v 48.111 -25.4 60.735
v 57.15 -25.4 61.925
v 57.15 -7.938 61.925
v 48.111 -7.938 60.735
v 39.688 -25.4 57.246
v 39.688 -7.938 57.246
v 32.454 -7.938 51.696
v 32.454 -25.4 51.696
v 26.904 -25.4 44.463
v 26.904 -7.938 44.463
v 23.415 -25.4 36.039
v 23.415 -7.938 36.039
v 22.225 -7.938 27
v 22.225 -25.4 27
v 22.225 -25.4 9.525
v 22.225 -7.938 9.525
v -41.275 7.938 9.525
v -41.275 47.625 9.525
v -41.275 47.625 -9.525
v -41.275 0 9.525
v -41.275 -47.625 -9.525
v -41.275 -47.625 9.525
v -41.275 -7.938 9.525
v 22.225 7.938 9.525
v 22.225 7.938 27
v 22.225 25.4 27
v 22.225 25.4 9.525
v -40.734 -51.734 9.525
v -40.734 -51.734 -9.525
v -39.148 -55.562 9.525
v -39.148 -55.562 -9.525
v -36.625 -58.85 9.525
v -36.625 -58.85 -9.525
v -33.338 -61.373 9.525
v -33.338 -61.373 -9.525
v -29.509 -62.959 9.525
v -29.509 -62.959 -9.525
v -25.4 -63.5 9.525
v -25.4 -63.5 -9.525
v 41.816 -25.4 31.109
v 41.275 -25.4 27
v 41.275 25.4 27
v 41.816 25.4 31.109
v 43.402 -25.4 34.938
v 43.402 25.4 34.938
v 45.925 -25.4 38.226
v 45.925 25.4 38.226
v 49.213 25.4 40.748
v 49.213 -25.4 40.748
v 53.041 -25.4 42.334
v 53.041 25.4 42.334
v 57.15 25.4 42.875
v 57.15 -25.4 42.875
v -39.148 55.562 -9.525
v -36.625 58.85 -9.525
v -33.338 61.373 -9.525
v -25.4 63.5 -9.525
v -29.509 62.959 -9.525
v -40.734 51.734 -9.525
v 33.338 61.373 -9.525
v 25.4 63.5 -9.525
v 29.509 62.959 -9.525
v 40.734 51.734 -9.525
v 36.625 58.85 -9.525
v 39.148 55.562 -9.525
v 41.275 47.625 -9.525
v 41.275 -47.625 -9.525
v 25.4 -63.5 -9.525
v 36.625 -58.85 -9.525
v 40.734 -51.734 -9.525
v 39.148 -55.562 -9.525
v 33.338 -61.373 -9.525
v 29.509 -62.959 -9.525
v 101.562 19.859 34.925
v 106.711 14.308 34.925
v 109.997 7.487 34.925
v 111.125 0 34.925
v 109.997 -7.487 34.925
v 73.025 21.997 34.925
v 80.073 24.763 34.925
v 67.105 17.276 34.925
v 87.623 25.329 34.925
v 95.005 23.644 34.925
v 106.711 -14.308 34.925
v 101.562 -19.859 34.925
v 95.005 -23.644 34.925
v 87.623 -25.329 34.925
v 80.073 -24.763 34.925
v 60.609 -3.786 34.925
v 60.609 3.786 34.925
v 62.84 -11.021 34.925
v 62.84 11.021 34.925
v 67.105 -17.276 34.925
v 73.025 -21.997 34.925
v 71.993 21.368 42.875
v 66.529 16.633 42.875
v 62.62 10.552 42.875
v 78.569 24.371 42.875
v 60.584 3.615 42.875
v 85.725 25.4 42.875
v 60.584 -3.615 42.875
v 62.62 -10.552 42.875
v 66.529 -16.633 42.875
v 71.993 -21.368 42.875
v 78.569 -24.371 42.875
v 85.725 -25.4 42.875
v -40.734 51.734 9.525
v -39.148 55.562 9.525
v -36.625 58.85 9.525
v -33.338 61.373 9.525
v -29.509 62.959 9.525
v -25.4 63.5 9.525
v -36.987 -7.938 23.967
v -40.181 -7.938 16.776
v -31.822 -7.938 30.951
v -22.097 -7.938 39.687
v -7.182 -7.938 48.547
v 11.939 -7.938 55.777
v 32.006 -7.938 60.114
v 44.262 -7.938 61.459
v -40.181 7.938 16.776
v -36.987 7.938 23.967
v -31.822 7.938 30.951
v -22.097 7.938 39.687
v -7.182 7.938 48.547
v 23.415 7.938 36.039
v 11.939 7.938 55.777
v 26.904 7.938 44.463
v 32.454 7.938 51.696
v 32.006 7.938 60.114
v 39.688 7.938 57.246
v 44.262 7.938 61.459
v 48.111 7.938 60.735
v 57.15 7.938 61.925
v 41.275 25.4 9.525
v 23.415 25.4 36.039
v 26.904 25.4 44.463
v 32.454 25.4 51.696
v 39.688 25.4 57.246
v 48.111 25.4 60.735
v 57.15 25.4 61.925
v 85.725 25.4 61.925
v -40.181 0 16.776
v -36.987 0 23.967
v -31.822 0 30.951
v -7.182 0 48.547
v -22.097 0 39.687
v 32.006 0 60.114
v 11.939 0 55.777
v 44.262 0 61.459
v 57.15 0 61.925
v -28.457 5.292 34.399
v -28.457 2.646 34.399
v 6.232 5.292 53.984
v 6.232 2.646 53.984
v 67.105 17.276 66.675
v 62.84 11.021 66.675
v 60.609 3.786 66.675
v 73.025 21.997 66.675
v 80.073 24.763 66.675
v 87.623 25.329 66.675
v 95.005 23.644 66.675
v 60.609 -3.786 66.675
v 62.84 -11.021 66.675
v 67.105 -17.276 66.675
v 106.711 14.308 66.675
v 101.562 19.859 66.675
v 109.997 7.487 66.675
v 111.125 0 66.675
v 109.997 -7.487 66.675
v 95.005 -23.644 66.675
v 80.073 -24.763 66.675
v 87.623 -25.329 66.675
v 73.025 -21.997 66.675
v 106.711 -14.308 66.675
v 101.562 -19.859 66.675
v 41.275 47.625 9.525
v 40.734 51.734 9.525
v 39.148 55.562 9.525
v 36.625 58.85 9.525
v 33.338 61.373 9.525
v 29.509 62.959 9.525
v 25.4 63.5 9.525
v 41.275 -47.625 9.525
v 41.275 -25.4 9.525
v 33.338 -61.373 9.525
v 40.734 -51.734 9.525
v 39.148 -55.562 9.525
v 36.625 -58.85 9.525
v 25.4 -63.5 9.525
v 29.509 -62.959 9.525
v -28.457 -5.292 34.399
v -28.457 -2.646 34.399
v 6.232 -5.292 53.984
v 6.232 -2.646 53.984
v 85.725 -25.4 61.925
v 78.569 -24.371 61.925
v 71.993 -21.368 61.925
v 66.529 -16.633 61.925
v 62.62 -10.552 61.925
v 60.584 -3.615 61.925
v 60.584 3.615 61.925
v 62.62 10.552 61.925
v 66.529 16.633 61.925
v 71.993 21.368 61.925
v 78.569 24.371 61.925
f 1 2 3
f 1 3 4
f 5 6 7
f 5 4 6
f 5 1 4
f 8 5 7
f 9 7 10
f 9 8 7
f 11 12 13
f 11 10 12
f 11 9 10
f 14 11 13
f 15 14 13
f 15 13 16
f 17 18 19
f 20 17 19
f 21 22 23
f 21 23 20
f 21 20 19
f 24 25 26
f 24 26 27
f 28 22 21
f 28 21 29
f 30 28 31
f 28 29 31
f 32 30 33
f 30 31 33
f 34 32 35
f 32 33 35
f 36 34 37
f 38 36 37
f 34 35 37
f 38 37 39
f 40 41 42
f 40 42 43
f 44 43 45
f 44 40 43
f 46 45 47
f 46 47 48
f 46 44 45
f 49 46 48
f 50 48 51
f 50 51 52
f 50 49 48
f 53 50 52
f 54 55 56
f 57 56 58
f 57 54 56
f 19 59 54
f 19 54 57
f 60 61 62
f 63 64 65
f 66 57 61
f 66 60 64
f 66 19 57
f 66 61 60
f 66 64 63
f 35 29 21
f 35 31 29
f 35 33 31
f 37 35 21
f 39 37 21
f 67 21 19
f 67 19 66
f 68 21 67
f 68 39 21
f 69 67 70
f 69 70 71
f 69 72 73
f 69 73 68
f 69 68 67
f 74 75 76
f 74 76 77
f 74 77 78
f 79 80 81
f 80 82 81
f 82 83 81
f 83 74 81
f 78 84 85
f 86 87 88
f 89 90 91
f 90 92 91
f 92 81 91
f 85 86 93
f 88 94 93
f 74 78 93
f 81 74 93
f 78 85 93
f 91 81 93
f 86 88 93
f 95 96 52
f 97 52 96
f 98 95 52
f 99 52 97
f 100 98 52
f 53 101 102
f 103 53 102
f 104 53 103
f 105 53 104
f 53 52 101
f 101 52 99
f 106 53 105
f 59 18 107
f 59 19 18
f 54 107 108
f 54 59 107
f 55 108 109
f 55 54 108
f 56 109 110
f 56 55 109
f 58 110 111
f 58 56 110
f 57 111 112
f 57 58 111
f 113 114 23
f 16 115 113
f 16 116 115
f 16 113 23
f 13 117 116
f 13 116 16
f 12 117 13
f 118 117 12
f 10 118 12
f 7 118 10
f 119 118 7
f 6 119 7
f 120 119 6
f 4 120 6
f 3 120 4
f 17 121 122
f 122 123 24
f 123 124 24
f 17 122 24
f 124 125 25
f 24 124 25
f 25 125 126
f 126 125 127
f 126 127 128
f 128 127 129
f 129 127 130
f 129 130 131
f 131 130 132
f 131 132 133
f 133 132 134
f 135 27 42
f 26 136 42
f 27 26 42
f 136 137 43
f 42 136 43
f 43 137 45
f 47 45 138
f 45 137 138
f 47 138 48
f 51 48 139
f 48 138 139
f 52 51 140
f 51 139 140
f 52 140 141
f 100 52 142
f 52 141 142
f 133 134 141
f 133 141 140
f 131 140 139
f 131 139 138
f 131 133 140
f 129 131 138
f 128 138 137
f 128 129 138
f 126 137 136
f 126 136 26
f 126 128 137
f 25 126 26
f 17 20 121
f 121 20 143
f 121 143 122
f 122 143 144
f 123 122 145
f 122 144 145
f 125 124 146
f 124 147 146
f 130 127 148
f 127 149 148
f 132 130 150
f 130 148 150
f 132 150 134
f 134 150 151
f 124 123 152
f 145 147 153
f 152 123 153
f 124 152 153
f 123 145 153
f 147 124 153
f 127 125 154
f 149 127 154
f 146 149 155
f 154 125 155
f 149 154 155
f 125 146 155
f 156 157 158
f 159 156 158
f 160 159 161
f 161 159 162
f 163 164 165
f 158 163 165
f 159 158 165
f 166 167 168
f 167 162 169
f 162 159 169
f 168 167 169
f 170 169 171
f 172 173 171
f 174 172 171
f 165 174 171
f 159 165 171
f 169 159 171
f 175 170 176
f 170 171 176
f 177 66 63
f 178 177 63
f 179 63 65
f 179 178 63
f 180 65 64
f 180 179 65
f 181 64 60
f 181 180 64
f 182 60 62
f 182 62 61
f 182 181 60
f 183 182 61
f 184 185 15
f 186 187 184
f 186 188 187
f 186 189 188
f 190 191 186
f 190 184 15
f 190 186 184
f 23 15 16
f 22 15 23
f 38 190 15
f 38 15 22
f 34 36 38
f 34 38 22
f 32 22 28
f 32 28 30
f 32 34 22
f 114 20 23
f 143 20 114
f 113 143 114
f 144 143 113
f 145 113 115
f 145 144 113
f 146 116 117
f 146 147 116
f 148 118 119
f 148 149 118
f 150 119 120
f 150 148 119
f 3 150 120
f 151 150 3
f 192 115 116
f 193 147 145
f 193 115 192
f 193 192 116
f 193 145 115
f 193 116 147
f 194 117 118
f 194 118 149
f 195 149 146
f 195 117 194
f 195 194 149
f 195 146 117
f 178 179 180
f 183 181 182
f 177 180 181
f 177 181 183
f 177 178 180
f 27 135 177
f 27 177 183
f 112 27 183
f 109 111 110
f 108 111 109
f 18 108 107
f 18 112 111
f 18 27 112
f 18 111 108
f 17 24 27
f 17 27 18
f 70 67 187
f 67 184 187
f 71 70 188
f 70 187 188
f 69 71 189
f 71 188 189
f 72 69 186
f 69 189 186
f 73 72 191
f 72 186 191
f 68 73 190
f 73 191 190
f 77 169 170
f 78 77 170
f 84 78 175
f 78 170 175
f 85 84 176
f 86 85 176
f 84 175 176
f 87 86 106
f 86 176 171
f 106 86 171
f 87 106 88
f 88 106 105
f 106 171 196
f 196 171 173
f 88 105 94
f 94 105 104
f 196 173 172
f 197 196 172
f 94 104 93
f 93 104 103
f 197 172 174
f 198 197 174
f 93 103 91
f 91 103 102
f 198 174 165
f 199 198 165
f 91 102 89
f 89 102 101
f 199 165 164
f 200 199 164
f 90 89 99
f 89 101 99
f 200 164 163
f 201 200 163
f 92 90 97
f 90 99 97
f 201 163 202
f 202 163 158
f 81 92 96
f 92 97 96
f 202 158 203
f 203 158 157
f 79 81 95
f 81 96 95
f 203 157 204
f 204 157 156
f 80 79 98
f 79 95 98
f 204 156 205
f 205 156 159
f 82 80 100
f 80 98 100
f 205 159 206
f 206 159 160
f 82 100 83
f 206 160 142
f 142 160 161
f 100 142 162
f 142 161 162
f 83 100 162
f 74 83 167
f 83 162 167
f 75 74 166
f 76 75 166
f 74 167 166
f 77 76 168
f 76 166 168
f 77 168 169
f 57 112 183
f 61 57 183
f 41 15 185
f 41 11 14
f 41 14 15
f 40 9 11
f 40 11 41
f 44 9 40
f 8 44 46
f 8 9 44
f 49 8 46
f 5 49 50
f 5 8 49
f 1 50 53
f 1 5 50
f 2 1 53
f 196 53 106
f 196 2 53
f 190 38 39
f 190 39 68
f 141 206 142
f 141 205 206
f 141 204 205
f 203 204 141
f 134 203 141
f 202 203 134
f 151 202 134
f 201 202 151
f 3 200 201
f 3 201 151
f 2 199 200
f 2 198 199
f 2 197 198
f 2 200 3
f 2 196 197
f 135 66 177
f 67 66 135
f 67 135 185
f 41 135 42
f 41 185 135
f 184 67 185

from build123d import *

# Parameters (mm, degrees)
F1_DEPTH = 63.5
F0_W     = 25.4
F0_H     = 19.05
F2_DEPTH = 25.4
F3_DEPTH = 7.9375
F5_R     = 15.875


with BuildPart() as f1:
    # F0 (on Front) → F1 (new body, symmetric)
    with BuildSketch(Plane.XZ):
        Polygon((41.275, -9.525), (41.275, 9.525), (22.225, 9.525), (-41.275, 9.525), (-41.275, -9.525), align=None)
    extrude(amount=F1_DEPTH, both=True)

    # F0 (on Front) → F2 (join, symmetric)
    with BuildSketch(Plane.XZ):
        Polygon((41.275, -9.525), (41.275, 9.525), (22.225, 9.525), (-41.275, 9.525), (-41.275, -9.525), align=None)
        with BuildLine():
            Line((22.225, 9.525), (41.275, 9.525))
            Line((41.275, 9.525), (41.275, 27.0002))
            ThreePointArc((41.275, 27.0002), (45.9246798487, 38.2255201513), (57.15, 42.8752))
            Line((57.15, 42.8752), (60.325, 42.8752))
            Line((60.325, 42.8752), (60.325, 61.9252))
            Line((60.325, 61.9252), (57.15, 61.9252))
            ThreePointArc((57.15, 61.9252), (32.4542956671, 51.6959043329), (22.225, 27.0002))
            Line((22.225, 27.0002), (22.225, 9.525))
        make_face()
        with Locations((73.025, 52.4002)):
            Rectangle(F0_W, F0_H)
    extrude(amount=F2_DEPTH, both=True)

    # F0 (on Front) → F3 (join, symmetric)
    with BuildSketch(Plane.XZ):
        with BuildLine():
            Line((-41.275, 9.525), (22.225, 9.525))
            Line((22.225, 9.525), (22.225, 27.0002))
            ThreePointArc((22.225, 27.0002), (32.4542956671, 51.6959043329), (57.15, 61.9252))
            add(Edge.make_bspline(
                [(-41.275, 9.525), (-41.275, 34.925), (0, 61.9252), (57.15, 61.9252)],
                knots=[0, 0, 0, 0, 111.5045361635, 111.5045361635, 111.5045361635, 111.5045361635], degree=3))
        make_face()
    extrude(amount=F3_DEPTH, both=True)

    # F0 (on Front) → F4 (revolve)
    with BuildSketch(Plane.XZ):
        Polygon((85.725, 61.9252), (85.725, 42.8752), (85.725, 34.925), (111.125, 34.925), (111.125, 66.675), (85.725, 66.675), align=None)
    revolve(axis=Axis((85.725, 0, 50.8), (0, 0, -1)))

    # F5
    f5_edges = [f1.edges().sort_by_distance(p)[0] for p in [
        (41.275, -63.5, 0),
        (-41.275, -63.5, 0),
        (-41.275, 63.5, 0),
        (41.275, 63.5, 0),
    ]]
    fillet(f5_edges, radius=F5_R)


solid = f1.part
